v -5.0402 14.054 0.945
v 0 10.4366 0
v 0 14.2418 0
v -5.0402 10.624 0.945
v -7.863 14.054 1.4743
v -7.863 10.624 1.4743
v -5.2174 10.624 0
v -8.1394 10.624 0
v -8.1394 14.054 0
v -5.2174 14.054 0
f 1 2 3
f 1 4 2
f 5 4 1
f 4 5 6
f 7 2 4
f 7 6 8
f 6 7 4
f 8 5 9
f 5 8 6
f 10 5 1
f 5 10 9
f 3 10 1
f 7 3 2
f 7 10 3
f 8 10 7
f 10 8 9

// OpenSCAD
extraAngle = 2;
extraRatio = tan(extraAngle);
secondPartHeight = 1.5;
secondPartSize = 8;

x0 = -14.21;
x1 = 12.85;
l = x1-x0;
function adjustZ(x) = -(x-x0)*tan(extraAngle)-.1;

base = [[x0,0.946],[x0,4.376],[-11.338,4.376],[x1,5.26],[x1,0.06],[-11.338,0.946]];

 points=[
   [-14.21,2.658,0],
   [-14.262,0.944,1.22],
   [-14.21,0.944,0],
   [-14.21,4.374,0],
   [-14.262,4.374,1.22],
   [14.26,2.658,1.556],
   [14.262,0,2.222],
   [14.262,5.32,2.222],
   [14.26,0,1.556],
   [14.26,5.32,1.556],
   [12.848,5.258,0],
   [12.848,0.06,0],
   [0.6719999,1.874,4.1],
   [0.6719999,1.374,4.928],
   [0.6719999,1.374,4.45],
   [0.6719999,2.438,1.452],
   [0.6719999,1.874,2.688],
   [0.6719999,1.874,1.45],
   [0.6719999,3.444,1.454],
   [0.6719999,2.882,2.69],
   [0.6719999,2.882,1.452],
   [0.6719999,1.374,2.688],
   [0.6719999,1.374,1.452],
   [0.6719999,2.438,4.452],
   [0.6719999,1.874,4.816],
   [0.6719999,2.438,2.69],
   [0.6719999,3.946,1.452],
   [0.6719999,3.444,2.692],
   [0.6719999,2.964,5.166],
   [0.6719999,3.444,4.104],
   [0.6719999,3.444,4.82],
   [0.6719999,3.946,4.928],
   [0.6719999,2.356,5.164],
   [0.6719999,2.882,4.454],
   [0.6719999,3.946,2.688],
   [0.6719999,3.946,4.45],
   [-11.366,0.944,1.24],
   [-11.366,4.374,1.24],
   [-3.672001,0.618,1.566],
   [-5.354001,1.694,1.494],
   [-5.580001,1.866,1.484],
   [-5.756001,2.094,1.476],
   [-5.864001,2.36,1.474],
   [-5.904001,2.644,1.47],
   [-5.086,1.582,1.506],
   [-4.804001,1.544,1.516],
   [-4.52,1.582,1.528],
   [-4.252001,1.694,1.542],
   [-4.026,1.866,1.55],
   [-3.85,2.094,1.558],
   [-3.742001,2.36,1.564],
   [-3.704,2.644,1.566],
   [-3.672001,4.7,1.566],
   [-5.354001,3.598,1.494],
   [-5.580001,3.422,1.484],
   [-5.756001,3.194,1.476],
   [-5.864001,2.928,1.474],
   [-5.086,3.708,1.506],
   [-4.804001,3.744,1.516],
   [-4.52,3.708,1.528],
   [-4.252001,3.598,1.542],
   [-4.026,3.422,1.55],
   [-3.85,3.194,1.558],
   [-3.742001,2.928,1.564],
   [-11.338,4.374,0],
   [-11.338,0.944,0],
   [10.83,1.866,5.584],
   [11.002,2.094,5.592],
   [11.148,2.094,2.198],
   [10.976,1.866,2.188],
   [-3.660001,4.7,1.266],
   [-3.660001,0.618,1.266],
   [9.246,3.194,2.116],
   [9.422001,3.42,2.124],
   [9.275999,3.42,5.518],
   [9.104,3.194,5.51],
   [8.954,2.644,5.506],
   [8.992001,2.928,5.508],
   [8.992001,2.36,5.508],
   [9.104,2.094,5.51],
   [9.275999,1.866,5.518],
   [10.052,1.544,5.55],
   [10.336,1.582,5.564],
   [10.482,1.582,2.166],
   [10.198,1.544,2.156],
   [-4.398001,3.598,4.936],
   [-4.172,3.422,4.948],
   [-4.398001,1.694,4.936],
   [-4.172,1.866,4.948],
   [-6.048001,2.644,4.868],
   [-6.010001,2.36,4.868],
   [9.77,3.708,5.54],
   [10.052,3.744,5.55],
   [9.77,1.582,5.54],
   [9.138,2.928,2.11],
   [-3.994,3.194,4.956],
   [10.83,3.42,5.584],
   [11.002,3.194,5.592],
   [11.114,2.36,5.598],
   [11.114,2.928,5.598],
   [11.152,2.644,5.598],
   [-6.010001,2.928,4.868],
   [-5.898001,2.094,4.874],
   [-5.898001,3.194,4.874],
   [-5.726001,3.422,4.882],
   [-5.726001,1.866,4.882],
   [-3.994,2.094,4.956],
   [-3.888,2.928,4.958],
   [-3.888,2.36,4.958],
   [-3.848001,2.644,4.96],
   [6.864,5.122,2.012],
   [6.878,5.122,1.714],
   [-5.498001,3.598,4.892],
   [-5.498001,1.694,4.892],
   [9.648001,3.598,2.132],
   [9.504,3.598,5.53],
   [1.471999,1.374,1.484],
   [2.88,1.374,1.544],
   [3.052,1.374,1.552],
   [3.844,1.374,1.584],
   [4.643999,1.374,1.62],
   [1.547999,0.41,1.488],
   [6.756001,0.2,1.71],
   [6.878,0.196,1.714],
   [1.471999,3.946,1.484],
   [1.438,3.946,4.468],
   [3.844,3.946,1.586],
   [3.844,3.946,1.584],
   [1.42,3.946,4.936],
   [1.455999,3.946,2.714],
   [3.809999,3.946,4.528],
   [3.792,3.946,4.976],
   [3.828,3.946,2.794],
   [3.846,3.946,1.586],
   [4.643999,3.946,2.82],
   [4.643999,3.946,4.546],
   [4.643999,3.946,4.986],
   [4.643999,3.946,1.62],
   [1.608,4.912,1.492],
   [11.148,3.194,2.198],
   [11.26,2.928,2.2],
   [6.874001,0.196,1.77],
   [-4.948001,1.544,4.912],
   [-5.232001,1.582,4.902],
   [-4.948001,3.744,4.912],
   [-5.232001,3.708,4.902],
   [9.914,1.582,2.142],
   [10.482,3.708,2.166],
   [10.336,3.708,5.564],
   [10.198,3.744,2.156],
   [-4.664001,3.708,4.926],
   [-4.664001,1.582,4.926],
   [6.864,0.196,2.012],
   [9.914,3.708,2.142],
   [11.294,2.644,2.204],
   [11.26,2.36,2.2],
   [9.916,1.582,2.142],
   [9.504,1.694,5.53],
   [10.238,1.55,2.148],
   [9.098,2.644,2.108],
   [10.604,3.598,5.574],
   [10.604,1.694,5.574],
   [10.976,3.42,2.188],
   [10.748,3.598,2.18],
   [10.23,3.738,2.148],
   [9.138,2.36,2.11],
   [9.422001,1.866,2.124],
   [9.246,2.094,2.116],
   [4.643999,3.444,1.622],
   [4.643999,2.882,1.622],
   [4.643999,3.444,2.82],
   [4.643999,2.882,2.82],
   [4.643999,1.374,2.82],
   [4.643999,1.874,2.818],
   [4.643999,1.874,4.192],
   [4.643999,2.438,4.544],
   [4.643999,1.374,4.546],
   [4.643999,1.874,4.87],
   [4.643999,2.356,5.218],
   [4.643999,1.874,1.62],
   [4.643999,1.374,4.986],
   [4.643999,2.438,2.82],
   [4.643999,3.444,4.872],
   [4.643999,2.964,5.218],
   [4.643999,3.444,4.194],
   [4.643999,2.882,4.544],
   [4.643999,2.438,1.62],
   [4.643999,2.66,1.62],
   [10.748,1.694,2.18],
   [6.802,1.58,0.004],
   [6.802,0.28,0.004],
   [6.802,4.18,0.004],
   [6.802,5.038,0.004],
   [-5.292001,2.024,0.018],
   [-5.292001,0.7240001,0.018],
   [-5.292001,3.738,0.018],
   [-5.292001,4.596,0.018],
   [3.828,3.444,2.794],
   [3.844,3.444,1.584],
   [3.828,1.374,2.794],
   [3.844,1.874,1.584],
   [3.828,1.874,2.794],
   [1.438,1.374,4.468],
   [1.42,1.374,4.936],
   [3.809999,1.374,4.528],
   [3.792,1.374,4.976],
   [1.455999,1.374,2.714],
   [9.648001,1.694,2.132],
   [5.299999,0.31,1.412],
   [9.68,1.678,2.132],
   [9.674,3.606,2.132],
   [5.299999,5.01,1.412],
   [1.471999,3.444,1.484],
   [1.471999,1.874,1.484],
   [7.860001,0.236,1.172],
   [1.46,0.472,0.788],
   [1.455999,3.444,2.714],
   [1.455999,1.874,2.714],
   [3.809999,3.444,4.176],
   [1.438,3.444,4.116],
   [3.809999,1.874,4.176],
   [1.438,1.874,4.116],
   [0.6779995,2.21,5.88],
   [4.577999,2.21,5.934],
   [0.6779995,3.108,5.882],
   [4.577999,3.108,5.934],
   [1.41,1.792,5.414],
   [3.822,1.792,5.45],
   [1.41,3.526,5.414],
   [3.822,3.526,5.45],
   [7.153999,0.266,0.394],
   [-4.940001,0.708,0.406],
   [0.7559996,4.818,0.012],
   [4.596001,4.98,0.634],
   [0.7559996,0.502,0.012],
   [0.7559996,3.102,0.012],
 ];
 faces=[
  [0,1,2,],
  [0,3,4,],
  [1,0,4,],
  [5,6,7,],
  [6,5,8,],
  [9,5,7,],
  [5,10,8,],
  [11,8,10,],
  [10,5,9,],
  [12,13,14,],
  [15,16,17,],
  [18,19,20,],
  [17,21,22,],
  [23,24,12,],
  [13,12,24,],
  [12,25,23,],
  [26,27,18,],
  [28,29,30,],
  [28,30,31,],
  [13,24,32,],
  [29,28,33,],
  [25,12,16,],
  [27,33,19,],
  [27,26,34,],
  [30,35,31,],
  [33,27,29,],
  [23,32,24,],
  [19,18,27,],
  [35,30,29,],
  [21,17,16,],
  [16,15,25,],
  [36,37,38,],
  [37,39,38,],
  [40,39,37,],
  [41,40,37,],
  [42,41,37,],
  [43,42,37,],
  [44,38,39,],
  [45,38,44,],
  [46,38,45,],
  [47,38,46,],
  [48,38,47,],
  [49,38,48,],
  [50,38,49,],
  [51,38,50,],
  [52,53,37,],
  [54,37,53,],
  [55,37,54,],
  [56,37,55,],
  [43,37,56,],
  [57,53,52,],
  [58,57,52,],
  [59,58,52,],
  [60,59,52,],
  [61,60,52,],
  [62,61,52,],
  [63,62,52,],
  [51,63,52,],
  [38,51,52,],
  [64,0,2,],
  [2,65,64,],
  [64,3,0,],
  [66,67,68,],
  [68,69,66,],
  [38,70,71,],
  [70,38,52,],
  [72,73,74,],
  [74,75,72,],
  [76,77,78,],
  [77,79,78,],
  [79,77,75,],
  [75,80,79,],
  [80,75,74,],
  [81,82,83,],
  [83,84,81,],
  [85,86,87,],
  [88,87,86,],
  [42,43,89,],
  [89,90,42,],
  [81,91,92,],
  [91,81,93,],
  [94,72,75,],
  [75,77,94,],
  [95,86,61,],
  [61,62,95,],
  [96,67,66,],
  [67,96,97,],
  [97,98,67,],
  [98,97,99,],
  [100,98,99,],
  [89,101,90,],
  [102,90,103,],
  [101,103,90,],
  [103,104,102,],
  [105,102,104,],
  [64,70,52,],
  [52,37,64,],
  [36,4,37,],
  [4,36,1,],
  [86,106,88,],
  [106,86,95,],
  [95,107,106,],
  [108,106,107,],
  [109,108,107,],
  [7,110,111,],
  [111,9,7,],
  [104,112,105,],
  [113,105,112,],
  [114,115,74,],
  [74,73,114,],
  [53,112,104,],
  [104,54,53,],
  [116,117,22,],
  [118,119,120,],
  [117,118,22,],
  [121,71,22,],
  [118,120,122,],
  [118,122,22,],
  [123,122,111,],
  [124,26,70,],
  [125,31,35,],
  [126,127,124,],
  [31,125,128,],
  [34,124,129,],
  [124,34,26,],
  [130,131,125,],
  [132,133,134,],
  [128,125,131,],
  [135,136,130,],
  [131,130,136,],
  [137,134,133,],
  [133,132,126,],
  [138,111,137,],
  [124,70,126,],
  [126,70,133,],
  [133,70,137,],
  [99,97,139,],
  [139,140,99,],
  [123,111,141,],
  [142,143,144,],
  [145,144,143,],
  [93,81,84,],
  [84,146,93,],
  [64,4,3,],
  [4,64,37,],
  [71,70,22,],
  [70,26,18,],
  [70,18,20,],
  [70,17,22,],
  [17,70,15,],
  [15,70,20,],
  [147,148,92,],
  [92,149,147,],
  [57,145,112,],
  [112,53,57,],
  [105,113,39,],
  [39,40,105,],
  [61,86,85,],
  [85,60,61,],
  [40,41,102,],
  [102,105,40,],
  [150,87,151,],
  [87,150,85,],
  [41,42,90,],
  [90,102,41,],
  [152,141,111,],
  [111,110,152,],
  [143,142,45,],
  [45,44,143,],
  [149,92,91,],
  [91,153,149,],
  [106,108,50,],
  [50,49,106,],
  [59,144,58,],
  [144,59,150,],
  [55,54,104,],
  [104,103,55,],
  [56,55,103,],
  [103,101,56,],
  [113,143,44,],
  [44,39,113,],
  [100,99,140,],
  [140,154,100,],
  [108,109,51,],
  [51,50,108,],
  [98,100,154,],
  [154,155,98,],
  [58,144,145,],
  [145,57,58,],
  [146,84,156,],
  [157,74,115,],
  [74,157,80,],
  [158,84,83,],
  [67,98,155,],
  [155,68,67,],
  [88,106,49,],
  [49,48,88,],
  [65,36,38,],
  [38,71,65,],
  [159,94,77,],
  [77,76,159,],
  [148,160,82,],
  [161,82,160,],
  [1,65,2,],
  [65,1,36,],
  [109,107,63,],
  [63,51,109,],
  [162,96,160,],
  [160,163,162,],
  [164,147,149,],
  [142,46,45,],
  [46,142,151,],
  [82,92,148,],
  [92,82,81,],
  [43,56,101,],
  [101,89,43,],
  [165,159,76,],
  [76,78,165,],
  [166,167,79,],
  [79,80,166,],
  [97,96,162,],
  [162,139,97,],
  [168,169,170,],
  [171,170,169,],
  [172,173,120,],
  [174,175,173,],
  [174,176,177,],
  [178,175,174,],
  [179,120,173,],
  [177,178,174,],
  [177,180,178,],
  [137,168,134,],
  [181,173,175,],
  [170,134,168,],
  [182,183,136,],
  [180,177,176,],
  [184,185,182,],
  [186,179,181,],
  [185,184,171,],
  [182,136,184,],
  [135,184,136,],
  [170,171,184,],
  [183,182,185,],
  [173,181,179,],
  [169,168,187,],
  [60,85,150,],
  [150,59,60,],
  [107,95,62,],
  [62,63,107,],
  [82,161,188,],
  [188,83,82,],
  [11,189,190,],
  [189,11,10,],
  [10,191,189,],
  [10,192,191,],
  [193,64,65,],
  [65,194,193,],
  [64,193,195,],
  [64,195,196,],
  [132,197,198,],
  [198,127,126,],
  [198,126,132,],
  [199,200,201,],
  [200,199,119,],
  [93,157,91,],
  [115,91,157,],
  [163,160,148,],
  [148,147,163,],
  [13,202,14,],
  [202,13,203,],
  [180,176,204,],
  [204,205,180,],
  [204,203,205,],
  [203,204,202,],
  [116,21,206,],
  [172,120,119,],
  [21,116,22,],
  [119,199,172,],
  [167,165,78,],
  [78,79,167,],
  [157,146,207,],
  [146,157,93,],
  [80,157,207,],
  [207,166,80,],
  [8,123,6,],
  [141,152,6,],
  [123,141,6,],
  [66,161,96,],
  [160,96,161,],
  [71,121,208,],
  [123,8,122,],
  [84,209,166,],
  [152,166,209,],
  [152,209,156,],
  [152,156,84,],
  [152,84,6,],
  [207,84,166,],
  [209,84,207,],
  [146,156,209,],
  [209,207,146,],
  [158,83,6,],
  [83,188,6,],
  [188,69,6,],
  [69,68,6,],
  [68,155,6,],
  [155,154,6,],
  [7,149,110,],
  [73,210,149,],
  [210,73,110,],
  [153,210,110,],
  [149,153,110,],
  [152,110,166,],
  [167,166,110,],
  [165,167,110,],
  [159,165,110,],
  [73,72,110,],
  [94,110,72,],
  [159,110,94,],
  [114,73,149,],
  [210,114,149,],
  [210,153,114,],
  [147,164,7,],
  [163,147,7,],
  [162,163,7,],
  [139,162,7,],
  [140,139,7,],
  [154,140,7,],
  [6,154,7,],
  [211,9,111,],
  [112,143,113,],
  [143,112,145,],
  [151,87,47,],
  [47,46,151,],
  [161,66,69,],
  [69,188,161,],
  [87,88,48,],
  [48,47,87,],
  [198,212,127,],
  [124,127,212,],
  [213,200,116,],
  [151,144,150,],
  [144,151,142,],
  [153,115,114,],
  [115,153,91,],
  [158,6,84,],
  [7,164,149,],
  [200,119,118,],
  [118,117,116,],
  [200,118,116,],
  [214,8,11,],
  [215,71,208,],
  [208,214,215,],
  [64,196,70,],
  [9,211,10,],
  [120,179,122,],
  [168,137,111,],
  [179,111,122,],
  [168,111,187,],
  [187,111,186,],
  [186,111,179,],
  [15,20,169,],
  [186,15,187,],
  [187,15,169,],
  [28,183,185,],
  [185,33,28,],
  [181,175,25,],
  [23,25,175,],
  [186,181,15,],
  [25,15,181,],
  [206,213,116,],
  [216,124,212,],
  [213,206,217,],
  [124,216,129,],
  [218,197,184,],
  [170,184,197,],
  [216,198,197,],
  [29,27,219,],
  [216,219,27,],
  [197,219,216,],
  [198,216,212,],
  [219,197,218,],
  [220,221,202,],
  [202,204,220,],
  [19,169,20,],
  [169,19,171,],
  [171,33,185,],
  [33,171,19,],
  [12,217,16,],
  [221,201,217,],
  [220,173,201,],
  [173,220,174,],
  [217,12,221,],
  [200,217,201,],
  [217,200,213,],
  [201,221,220,],
  [34,129,216,],
  [216,27,34,],
  [23,175,178,],
  [178,32,23,],
  [29,219,125,],
  [125,35,29,],
  [132,134,170,],
  [170,197,132,],
  [218,184,135,],
  [135,130,218,],
  [206,21,16,],
  [16,217,206,],
  [221,12,14,],
  [14,202,221,],
  [172,199,201,],
  [201,173,172,],
  [174,220,204,],
  [204,176,174,],
  [219,218,130,],
  [130,125,219,],
  [222,32,178,],
  [178,223,222,],
  [183,28,224,],
  [224,225,183,],
  [205,203,226,],
  [226,227,205,],
  [224,31,128,],
  [128,228,224,],
  [225,229,131,],
  [131,136,225,],
  [223,180,205,],
  [205,227,223,],
  [222,226,203,],
  [203,13,222,],
  [32,222,13,],
  [180,223,178,],
  [183,225,136,],
  [31,224,28,],
  [128,131,229,],
  [229,228,128,],
  [228,229,225,],
  [225,224,228,],
  [227,226,222,],
  [222,223,227,],
  [230,11,190,],
  [231,65,71,],
  [194,65,231,],
  [196,232,70,],
  [233,70,232,],
  [8,208,122,],
  [8,214,208,],
  [111,138,211,],
  [70,233,211,],
  [192,10,233,],
  [233,10,211,],
  [11,230,214,],
  [231,215,234,],
  [215,231,71,],
  [189,235,234,],
  [191,232,235,],
  [235,189,191,],
  [234,190,189,],
  [232,191,192,],
  [234,193,194,],
  [193,234,235,],
  [235,195,193,],
  [195,235,232,],
  [232,196,195,],
  [190,234,215,],
  [234,194,231,],
  [232,192,233,],
  [230,215,214,],
  [215,230,190,],
  [70,138,137,],
  [138,70,211,],
  [122,121,22,],
  [121,122,208,],
 ];

points = [
   [-14.262,0.9460001,1.222],
   [-14.21,0.9460001,0],
   [-14.21,2.66,0],
   [14.26,0,1.556],
   [14.262,0,2.224],
   [14.26,2.66,1.556],
   [12.85,5.26,0],
   [12.85,0.06,0],
   [0.6739998,2.438693,1.452648],
   [0.6739998,2.438693,2.690244],
   [0.6739998,1.876,2.68881],
   [0.6739998,1.876,1.451215],
   [-11.364,0.9460001,1.24],
   [-11.364,4.376,1.24],
   [-3.672001,0.62,1.566],
   [-5.352001,1.694,1.496],
   [-5.580001,1.868,1.486],
   [-5.754001,2.096,1.478],
   [-5.864001,2.362,1.474],
   [-5.902001,2.646,1.472],
   [-5.086,1.584,1.506],
   [-4.802001,1.546,1.518],
   [-4.518001,1.584,1.53],
   [-4.252001,1.694,1.542],
   [-4.026,1.868,1.552],
   [-3.85,2.096,1.56],
   [-3.740001,2.362,1.564],
   [-3.704,2.646,1.566],
   [-3.672001,4.702,1.566],
   [-5.352001,3.598,1.496],
   [-5.580001,3.424,1.486],
   [-5.754001,3.196,1.478],
   [-5.864001,2.93,1.474],
   [-5.086,3.708,1.506],
   [-4.802001,3.746,1.518],
   [-4.518001,3.708,1.53],
   [-4.252001,3.598,1.542],
   [-4.026,3.424,1.552],
   [-3.85,3.196,1.56],
   [-3.740001,2.93,1.564],
   [-14.21,4.376,0],
   [-11.338,4.376,0],
   [10.83,1.868,5.586],
   [11.004,2.096,5.594],
   [11.15,2.096,2.198],
   [10.976,1.868,2.19],
   [-3.658001,4.702,1.268],
   [-3.658001,0.62,1.268],
   [14.262,5.32,2.224],
   [14.26,5.32,1.556],
   [9.247999,3.196,2.116],
   [9.422001,3.422,2.124],
   [9.278,3.422,5.52],
   [9.104,3.196,5.512],
   [8.955999,2.646,5.506],
   [8.993999,2.93,5.508],
   [8.993999,2.362,5.508],
   [9.104,2.096,5.512],
   [9.278,1.868,5.52],
   [10.054,1.546,5.552],
   [10.338,1.584,5.564],
   [10.482,1.584,2.168],
   [10.198,1.546,2.156],
   [-4.170001,3.424,4.948],
   [-4.170001,1.868,4.948],
   [-4.398001,1.694,4.938],
   [-4.398001,3.598,4.938],
   [-6.046001,2.646,4.868],
   [-6.008001,2.362,4.87],
   [9.77,3.708,5.54],
   [10.054,3.744,5.552],
   [9.77,1.584,5.54],
   [9.138,2.93,2.112],
   [-3.994,3.196,4.956],
   [10.83,3.422,5.586],
   [11.004,3.196,5.594],
   [11.114,2.362,5.598],
   [11.114,2.93,5.598],
   [11.152,2.646,5.6],
   [-6.008001,2.93,4.87],
   [-5.898001,3.196,4.874],
   [-5.898001,2.096,4.874],
   [-5.724001,3.424,4.882],
   [-5.724001,1.868,4.882],
   [-14.262,4.376,1.222],
   [-3.994,2.096,4.956],
   [-3.886001,2.93,4.96],
   [-3.886001,2.362,4.96],
   [-3.848001,2.646,4.962],
   [6.865999,5.124,2.014],
   [6.878,5.124,1.716],
   [-5.496001,3.598,4.892],
   [-5.496001,1.694,4.892],
   [9.65,3.598,2.134],
   [9.506001,3.598,5.53],
   [1.474,1.376,1.486],
   [2.88109,1.375771,1.545672],
   [0.6739998,1.376,1.452],
   [3.052469,1.375743,1.55294],
   [3.846,1.376,1.586],
   [4.643999,1.376,1.62],
   [6.756001,0.202,1.71],
   [6.878,0.196,1.716],
   [1.474,3.946,1.486],
   [0.6739998,3.946,1.452],
   [4.643999,3.946,1.62],
   [3.846,3.946,1.586],
   [11.15,3.196,2.198],
   [11.26,2.93,2.202],
   [6.875999,0.196,1.772],
   [-4.946001,3.746,4.914],
   [-4.946001,1.546,4.914],
   [-5.232001,1.584,4.902],
   [-5.232001,3.708,4.902],
   [9.914,1.584,2.144],
   [0.6739998,3.446,1.455215],
   [0.6739998,2.883307,1.453781],
   [10.482,3.708,2.168],
   [10.338,3.708,5.564],
   [10.198,3.744,2.156],
   [-4.662001,3.708,4.926],
   [-4.662001,1.584,4.926],
   [0.6739998,3.946,4.928417],
   [0.6739998,3.946,4.45209],
   [1.438,3.946,4.468758],
   [1.42,3.946,4.936417],
   [6.865999,0.196,2.014],
   [9.914,3.708,2.144],
   [11.296,2.646,2.204],
   [11.26,2.362,2.202],
   [9.916,1.584,2.144],
   [9.506001,1.694,5.53],
   [10.24,1.552,2.15],
   [-11.338,0.9460001,0],
   [9.1,2.646,2.11],
   [10.604,3.598,5.576],
   [10.604,1.694,5.576],
   [10.976,3.422,2.19],
   [10.748,3.598,2.18],
   [10.23,3.74,2.15],
   [9.138,2.362,2.112],
   [9.422001,1.868,2.124],
   [9.247999,2.096,2.116],
   [4.643999,2.883307,1.622116],
   [4.643999,2.883307,2.821172],
   [4.643999,3.446,2.821889],
   [4.643999,3.446,1.622833],
   [10.748,1.694,2.18],
   [3.846,3.446,1.586],
   [3.828,3.946,2.794667],
   [3.828,3.446,2.794667],
   [4.643999,1.376,4.986417],
   [4.643999,1.376,4.546758],
   [3.809999,1.376,4.528757],
   [3.792,1.376,4.976417],
   [9.65,1.694,2.134],
   [0.6739998,1.376,4.928417],
   [1.42,1.376,4.936417],
   [1.438,1.376,4.468758],
   [0.6739998,1.376,4.45209],
   [9.681999,1.68,2.134],
   [9.676001,3.608,2.134],
   [1.474,3.446,1.486],
   [4.643999,3.946,4.986417],
   [3.792,3.946,4.976417],
   [3.809999,3.946,4.528757],
   [4.643999,3.946,4.546758],
   [1.474,1.876,1.486],
   [3.846,1.876,1.586],
   [4.643999,1.876,4.870596],
   [4.643999,1.876,4.193301],
   [4.643999,3.946,2.820667],
   [0.6739998,1.376,2.689333],
   [0.6739998,3.446,4.820596],
   [0.6739998,3.446,4.104761],
   [4.643999,1.876,1.620833],
   [4.643999,2.438693,1.62155],
   [0.6739998,3.446,2.69281],
   [0.6739998,2.883307,2.691376],
   [4.643999,1.876,2.819889],
   [4.643999,2.438693,2.820606],
   [0.6739998,2.965261,5.166567],
   [4.643999,2.965262,5.219284],
   [4.643999,2.883307,4.545651],
   [0.6739998,2.883307,4.454395],
   [1.456,3.446,2.714667],
   [1.455999,3.946,2.714667],
   [1.438,3.446,4.11769],
   [3.809999,3.446,4.17769],
   [0.6739998,3.946,2.689333],
   [4.643999,3.446,4.872596],
   [4.643999,3.446,4.195301],
   [3.809999,1.876,4.17769],
   [1.438,1.876,4.11769],
   [0.6739998,2.438693,4.453262],
   [0.6739998,2.356739,5.165434],
   [0.6739998,1.876,4.816596],
   [0.6739998,1.876,4.100761],
   [1.456,1.876,2.714667],
   [3.827999,1.876,2.794667],
   [1.455999,1.376,2.714667],
   [4.643999,1.376,2.820667],
   [3.828,1.376,2.794667],
   [4.643999,2.356739,5.218717],
   [4.643999,2.438693,4.545085],
   [0.6781511,2.211132,5.881999],
   [4.578203,2.21113,5.935049],
   [0.6781511,3.109434,5.883832],
   [4.578203,3.109437,5.934914],
   [1.410252,1.793566,5.414567],
   [3.823925,1.793565,5.450375],
   [1.410252,3.527717,5.41537],
   [3.823925,3.527718,5.45042],
 ];

faces=[
  [0,1,2,],
  [3,4,5,],
  [3,5,6,],
  [6,7,3,],
  [8,9,10,],
  [10,11,8,],
  [12,13,14,],
  [13,15,14,],
  [16,15,13,],
  [17,16,13,],
  [18,17,13,],
  [19,18,13,],
  [20,14,15,],
  [21,14,20,],
  [22,14,21,],
  [23,14,22,],
  [24,14,23,],
  [25,14,24,],
  [26,14,25,],
  [27,14,26,],
  [28,29,13,],
  [30,13,29,],
  [31,13,30,],
  [32,13,31,],
  [19,13,32,],
  [33,29,28,],
  [34,33,28,],
  [35,34,28,],
  [36,35,28,],
  [37,36,28,],
  [38,37,28,],
  [39,38,28,],
  [27,39,28,],
  [14,27,28,],
  [40,2,41,],
  [42,43,44,],
  [44,45,42,],
  [14,28,46,],
  [46,47,14,],
  [5,4,48,],
  [48,49,5,],
  [50,51,52,],
  [52,53,50,],
  [54,55,56,],
  [57,56,55,],
  [53,57,55,],
  [58,57,53,],
  [52,58,53,],
  [59,60,61,],
  [61,62,59,],
  [63,64,65,],
  [65,66,63,],
  [18,19,67,],
  [67,68,18,],
  [69,70,59,],
  [59,71,69,],
  [72,50,53,],
  [53,55,72,],
  [73,63,37,],
  [37,38,73,],
  [43,42,74,],
  [75,43,74,],
  [76,43,75,],
  [77,76,75,],
  [78,76,77,],
  [67,79,68,],
  [80,68,79,],
  [81,68,80,],
  [82,81,80,],
  [83,81,82,],
  [41,46,28,],
  [28,13,41,],
  [84,13,12,],
  [12,0,84,],
  [85,64,63,],
  [73,85,63,],
  [86,85,73,],
  [87,85,86,],
  [88,87,86,],
  [48,89,90,],
  [90,49,48,],
  [91,92,83,],
  [83,82,91,],
  [93,94,52,],
  [52,51,93,],
  [29,91,82,],
  [82,30,29,],
  [95,96,97,],
  [98,99,100,],
  [96,98,97,],
  [101,47,97,],
  [98,100,101,],
  [98,101,97,],
  [102,101,90,],
  [103,104,46,],
  [103,105,106,],
  [46,90,105,],
  [103,46,105,],
  [77,75,107,],
  [107,108,77,],
  [102,90,109,],
  [110,111,112,],
  [112,113,110,],
  [6,5,49,],
  [71,59,62,],
  [62,114,71,],
  [41,13,84,],
  [84,40,41,],
  [47,46,97,],
  [46,104,115,],
  [116,8,11,],
  [46,115,116,],
  [46,11,97,],
  [46,116,11,],
  [117,118,70,],
  [70,119,117,],
  [33,113,91,],
  [91,29,33,],
  [83,92,15,],
  [15,16,83,],
  [37,63,66,],
  [66,36,37,],
  [16,17,81,],
  [81,83,16,],
  [120,66,65,],
  [65,121,120,],
  [122,123,124,],
  [124,125,122,],
  [17,18,68,],
  [68,81,17,],
  [126,109,90,],
  [90,89,126,],
  [112,111,21,],
  [21,20,112,],
  [119,70,69,],
  [69,127,119,],
  [85,87,26,],
  [26,25,85,],
  [35,120,110,],
  [110,34,35,],
  [31,30,82,],
  [82,80,31,],
  [32,31,80,],
  [80,79,32,],
  [92,112,20,],
  [20,15,92,],
  [78,77,108,],
  [108,128,78,],
  [87,88,27,],
  [27,26,87,],
  [76,78,128,],
  [128,129,76,],
  [34,110,113,],
  [113,33,34,],
  [114,62,130,],
  [52,94,131,],
  [131,58,52,],
  [132,62,61,],
  [43,76,129,],
  [129,44,43,],
  [64,85,25,],
  [25,24,64,],
  [133,12,14,],
  [14,47,133,],
  [134,72,55,],
  [55,54,134,],
  [135,136,60,],
  [60,118,135,],
  [0,12,133,],
  [133,1,0,],
  [88,86,39,],
  [39,27,88,],
  [137,74,135,],
  [135,138,137,],
  [139,117,119,],
  [111,121,22,],
  [22,21,111,],
  [70,118,60,],
  [60,59,70,],
  [19,32,79,],
  [79,67,19,],
  [140,134,54,],
  [54,56,140,],
  [141,142,57,],
  [57,58,141,],
  [75,74,137,],
  [137,107,75,],
  [143,144,145,],
  [145,146,143,],
  [36,66,120,],
  [120,35,36,],
  [86,73,38,],
  [38,39,86,],
  [60,136,147,],
  [147,61,60,],
  [133,7,6,],
  [6,41,133,],
  [148,106,149,],
  [149,150,148,],
  [69,71,131,],
  [131,94,69,],
  [138,135,118,],
  [118,117,138,],
  [1,133,41,],
  [41,2,1,],
  [151,152,153,],
  [153,154,151,],
  [142,140,56,],
  [56,57,142,],
  [131,71,114,],
  [114,155,131,],
  [156,157,158,],
  [158,159,156,],
  [58,131,155,],
  [155,141,58,],
  [3,102,4,],
  [109,126,4,],
  [102,109,4,],
  [74,42,136,],
  [136,135,74,],
  [47,101,3,],
  [102,3,101,],
  [84,0,2,],
  [2,40,84,],
  [62,160,141,],
  [126,141,160,],
  [126,160,130,],
  [126,130,62,],
  [126,62,4,],
  [155,62,141,],
  [160,62,155,],
  [114,130,160,],
  [160,155,114,],
  [132,61,4,],
  [61,147,4,],
  [147,45,4,],
  [45,44,4,],
  [44,129,4,],
  [129,128,4,],
  [48,119,89,],
  [51,161,119,],
  [161,51,89,],
  [127,161,89,],
  [119,127,89,],
  [126,89,141,],
  [142,141,89,],
  [140,142,89,],
  [134,140,89,],
  [51,50,89,],
  [72,89,50,],
  [134,89,72,],
  [93,51,119,],
  [161,93,119,],
  [161,127,93,],
  [117,139,48,],
  [138,117,48,],
  [137,138,48,],
  [107,137,48,],
  [108,107,48,],
  [128,108,48,],
  [4,128,48,],
  [46,49,90,],
  [91,113,112,],
  [112,92,91,],
  [121,65,23,],
  [23,22,121,],
  [136,42,45,],
  [45,147,136,],
  [65,64,24,],
  [24,23,65,],
  [162,103,106,],
  [106,148,162,],
  [110,120,121,],
  [121,111,110,],
  [127,69,94,],
  [94,93,127,],
  [132,4,62,],
  [48,139,119,],
  [163,164,165,],
  [165,166,163,],
  [167,168,95,],
  [168,99,98,],
  [98,96,95,],
  [168,98,95,],
  [3,7,133,],
  [133,47,3,],
  [46,41,6,],
  [6,49,46,],
  [169,170,152,],
  [152,151,169,],
  [146,145,171,],
  [171,105,146,],
  [11,10,172,],
  [172,97,11,],
  [173,174,123,],
  [123,122,173,],
  [100,175,101,],
  [175,176,143,],
  [146,105,90,],
  [175,143,146,],
  [175,90,101,],
  [175,146,90,],
  [115,177,178,],
  [178,116,115,],
  [175,179,180,],
  [180,176,175,],
  [8,116,143,],
  [143,176,8,],
  [181,182,183,],
  [183,184,181,],
  [8,176,180,],
  [180,9,8,],
  [185,186,103,],
  [103,162,185,],
  [185,162,148,],
  [148,150,185,],
  [187,185,150,],
  [150,188,187,],
  [189,104,103,],
  [103,186,189,],
  [183,182,190,],
  [190,191,183,],
  [144,183,191,],
  [191,145,144,],
  [192,193,158,],
  [158,153,192,],
  [171,149,106,],
  [106,105,171,],
  [191,190,163,],
  [163,166,191,],
  [177,115,104,],
  [104,189,177,],
  [174,173,181,],
  [181,184,174,],
  [177,174,184,],
  [184,178,177,],
  [178,144,143,],
  [143,116,178,],
  [184,183,144,],
  [144,178,184,],
  [194,195,196,],
  [196,197,194,],
  [9,194,197,],
  [197,10,9,],
  [198,199,168,],
  [168,167,198,],
  [193,192,199,],
  [199,198,193,],
  [200,198,167,],
  [167,95,200,],
  [201,100,99,],
  [99,202,201,],
  [172,200,95,],
  [95,97,172,],
  [202,99,168,],
  [168,199,202,],
  [179,175,100,],
  [100,201,179,],
  [197,196,156,],
  [156,159,197,],
  [189,186,185,],
  [185,177,189,],
  [170,169,203,],
  [203,204,170,],
  [179,170,204,],
  [204,180,179,],
  [194,204,203,],
  [203,195,194,],
  [9,180,204,],
  [204,194,9,],
  [177,185,187,],
  [187,174,177,],
  [174,187,124,],
  [124,123,174,],
  [149,171,145,],
  [145,150,149,],
  [150,145,191,],
  [191,188,150,],
  [188,191,166,],
  [166,165,188,],
  [200,172,10,],
  [10,198,200,],
  [198,10,197,],
  [197,193,198,],
  [193,197,159,],
  [159,158,193,],
  [201,202,199,],
  [199,179,201,],
  [179,199,192,],
  [192,170,179,],
  [170,192,153,],
  [153,152,170,],
  [153,158,157,],
  [157,154,153,],
  [187,188,165,],
  [165,124,187,],
  [124,165,164,],
  [164,125,124,],
  [205,195,203,],
  [203,206,205,],
  [182,181,207,],
  [207,208,182,],
  [154,157,209,],
  [209,210,154,],
  [207,122,125,],
  [125,211,207,],
  [208,212,164,],
  [164,163,208,],
  [206,151,154,],
  [154,210,206,],
  [205,209,157,],
  [157,156,205,],
  [195,205,156,],
  [156,196,195,],
  [203,169,151,],
  [151,206,203,],
  [182,208,163,],
  [163,190,182,],
  [181,173,122,],
  [122,207,181,],
  [125,164,212,],
  [212,211,125,],
  [211,212,208,],
  [208,207,211,],
  [210,209,205,],
  [205,206,210,]];

stlObject1_size=[28.524,5.32,5.935049];

matrix = [ [cos(extraAngle), 0, -sin(extraAngle)],
        [ 0, 1, 0],
        [ sin(extraAngle), 0, cos(extraAngle) ] ] ;
                
echo ((matrix*[x0,0,0])[2]);        

function adjust(z) =
    z[2] == 0 ? z :
    matrix * z - [0,0,(matrix * [x0,0,0])[2]];
    
module main() {
    polyhedron(points=[for (z=points) adjust(z)], faces=faces);
}

module secondary() {    
angle2 = atan2(secondPartHeight,secondPartSize);
    rotate([180,0,0])
    rotate([0,-angle2,0])
    render(convexity=2)
    intersection() {
        translate([-x0-secondPartSize,0,0])
        linear_extrude(height=secondPartHeight) polygon(base);
        rotate([0,angle2,0])
        translate([-50,-50,-100])
        cube([100,100,100]);
    }
}

//main();
translate([0,15,0]) secondary();
